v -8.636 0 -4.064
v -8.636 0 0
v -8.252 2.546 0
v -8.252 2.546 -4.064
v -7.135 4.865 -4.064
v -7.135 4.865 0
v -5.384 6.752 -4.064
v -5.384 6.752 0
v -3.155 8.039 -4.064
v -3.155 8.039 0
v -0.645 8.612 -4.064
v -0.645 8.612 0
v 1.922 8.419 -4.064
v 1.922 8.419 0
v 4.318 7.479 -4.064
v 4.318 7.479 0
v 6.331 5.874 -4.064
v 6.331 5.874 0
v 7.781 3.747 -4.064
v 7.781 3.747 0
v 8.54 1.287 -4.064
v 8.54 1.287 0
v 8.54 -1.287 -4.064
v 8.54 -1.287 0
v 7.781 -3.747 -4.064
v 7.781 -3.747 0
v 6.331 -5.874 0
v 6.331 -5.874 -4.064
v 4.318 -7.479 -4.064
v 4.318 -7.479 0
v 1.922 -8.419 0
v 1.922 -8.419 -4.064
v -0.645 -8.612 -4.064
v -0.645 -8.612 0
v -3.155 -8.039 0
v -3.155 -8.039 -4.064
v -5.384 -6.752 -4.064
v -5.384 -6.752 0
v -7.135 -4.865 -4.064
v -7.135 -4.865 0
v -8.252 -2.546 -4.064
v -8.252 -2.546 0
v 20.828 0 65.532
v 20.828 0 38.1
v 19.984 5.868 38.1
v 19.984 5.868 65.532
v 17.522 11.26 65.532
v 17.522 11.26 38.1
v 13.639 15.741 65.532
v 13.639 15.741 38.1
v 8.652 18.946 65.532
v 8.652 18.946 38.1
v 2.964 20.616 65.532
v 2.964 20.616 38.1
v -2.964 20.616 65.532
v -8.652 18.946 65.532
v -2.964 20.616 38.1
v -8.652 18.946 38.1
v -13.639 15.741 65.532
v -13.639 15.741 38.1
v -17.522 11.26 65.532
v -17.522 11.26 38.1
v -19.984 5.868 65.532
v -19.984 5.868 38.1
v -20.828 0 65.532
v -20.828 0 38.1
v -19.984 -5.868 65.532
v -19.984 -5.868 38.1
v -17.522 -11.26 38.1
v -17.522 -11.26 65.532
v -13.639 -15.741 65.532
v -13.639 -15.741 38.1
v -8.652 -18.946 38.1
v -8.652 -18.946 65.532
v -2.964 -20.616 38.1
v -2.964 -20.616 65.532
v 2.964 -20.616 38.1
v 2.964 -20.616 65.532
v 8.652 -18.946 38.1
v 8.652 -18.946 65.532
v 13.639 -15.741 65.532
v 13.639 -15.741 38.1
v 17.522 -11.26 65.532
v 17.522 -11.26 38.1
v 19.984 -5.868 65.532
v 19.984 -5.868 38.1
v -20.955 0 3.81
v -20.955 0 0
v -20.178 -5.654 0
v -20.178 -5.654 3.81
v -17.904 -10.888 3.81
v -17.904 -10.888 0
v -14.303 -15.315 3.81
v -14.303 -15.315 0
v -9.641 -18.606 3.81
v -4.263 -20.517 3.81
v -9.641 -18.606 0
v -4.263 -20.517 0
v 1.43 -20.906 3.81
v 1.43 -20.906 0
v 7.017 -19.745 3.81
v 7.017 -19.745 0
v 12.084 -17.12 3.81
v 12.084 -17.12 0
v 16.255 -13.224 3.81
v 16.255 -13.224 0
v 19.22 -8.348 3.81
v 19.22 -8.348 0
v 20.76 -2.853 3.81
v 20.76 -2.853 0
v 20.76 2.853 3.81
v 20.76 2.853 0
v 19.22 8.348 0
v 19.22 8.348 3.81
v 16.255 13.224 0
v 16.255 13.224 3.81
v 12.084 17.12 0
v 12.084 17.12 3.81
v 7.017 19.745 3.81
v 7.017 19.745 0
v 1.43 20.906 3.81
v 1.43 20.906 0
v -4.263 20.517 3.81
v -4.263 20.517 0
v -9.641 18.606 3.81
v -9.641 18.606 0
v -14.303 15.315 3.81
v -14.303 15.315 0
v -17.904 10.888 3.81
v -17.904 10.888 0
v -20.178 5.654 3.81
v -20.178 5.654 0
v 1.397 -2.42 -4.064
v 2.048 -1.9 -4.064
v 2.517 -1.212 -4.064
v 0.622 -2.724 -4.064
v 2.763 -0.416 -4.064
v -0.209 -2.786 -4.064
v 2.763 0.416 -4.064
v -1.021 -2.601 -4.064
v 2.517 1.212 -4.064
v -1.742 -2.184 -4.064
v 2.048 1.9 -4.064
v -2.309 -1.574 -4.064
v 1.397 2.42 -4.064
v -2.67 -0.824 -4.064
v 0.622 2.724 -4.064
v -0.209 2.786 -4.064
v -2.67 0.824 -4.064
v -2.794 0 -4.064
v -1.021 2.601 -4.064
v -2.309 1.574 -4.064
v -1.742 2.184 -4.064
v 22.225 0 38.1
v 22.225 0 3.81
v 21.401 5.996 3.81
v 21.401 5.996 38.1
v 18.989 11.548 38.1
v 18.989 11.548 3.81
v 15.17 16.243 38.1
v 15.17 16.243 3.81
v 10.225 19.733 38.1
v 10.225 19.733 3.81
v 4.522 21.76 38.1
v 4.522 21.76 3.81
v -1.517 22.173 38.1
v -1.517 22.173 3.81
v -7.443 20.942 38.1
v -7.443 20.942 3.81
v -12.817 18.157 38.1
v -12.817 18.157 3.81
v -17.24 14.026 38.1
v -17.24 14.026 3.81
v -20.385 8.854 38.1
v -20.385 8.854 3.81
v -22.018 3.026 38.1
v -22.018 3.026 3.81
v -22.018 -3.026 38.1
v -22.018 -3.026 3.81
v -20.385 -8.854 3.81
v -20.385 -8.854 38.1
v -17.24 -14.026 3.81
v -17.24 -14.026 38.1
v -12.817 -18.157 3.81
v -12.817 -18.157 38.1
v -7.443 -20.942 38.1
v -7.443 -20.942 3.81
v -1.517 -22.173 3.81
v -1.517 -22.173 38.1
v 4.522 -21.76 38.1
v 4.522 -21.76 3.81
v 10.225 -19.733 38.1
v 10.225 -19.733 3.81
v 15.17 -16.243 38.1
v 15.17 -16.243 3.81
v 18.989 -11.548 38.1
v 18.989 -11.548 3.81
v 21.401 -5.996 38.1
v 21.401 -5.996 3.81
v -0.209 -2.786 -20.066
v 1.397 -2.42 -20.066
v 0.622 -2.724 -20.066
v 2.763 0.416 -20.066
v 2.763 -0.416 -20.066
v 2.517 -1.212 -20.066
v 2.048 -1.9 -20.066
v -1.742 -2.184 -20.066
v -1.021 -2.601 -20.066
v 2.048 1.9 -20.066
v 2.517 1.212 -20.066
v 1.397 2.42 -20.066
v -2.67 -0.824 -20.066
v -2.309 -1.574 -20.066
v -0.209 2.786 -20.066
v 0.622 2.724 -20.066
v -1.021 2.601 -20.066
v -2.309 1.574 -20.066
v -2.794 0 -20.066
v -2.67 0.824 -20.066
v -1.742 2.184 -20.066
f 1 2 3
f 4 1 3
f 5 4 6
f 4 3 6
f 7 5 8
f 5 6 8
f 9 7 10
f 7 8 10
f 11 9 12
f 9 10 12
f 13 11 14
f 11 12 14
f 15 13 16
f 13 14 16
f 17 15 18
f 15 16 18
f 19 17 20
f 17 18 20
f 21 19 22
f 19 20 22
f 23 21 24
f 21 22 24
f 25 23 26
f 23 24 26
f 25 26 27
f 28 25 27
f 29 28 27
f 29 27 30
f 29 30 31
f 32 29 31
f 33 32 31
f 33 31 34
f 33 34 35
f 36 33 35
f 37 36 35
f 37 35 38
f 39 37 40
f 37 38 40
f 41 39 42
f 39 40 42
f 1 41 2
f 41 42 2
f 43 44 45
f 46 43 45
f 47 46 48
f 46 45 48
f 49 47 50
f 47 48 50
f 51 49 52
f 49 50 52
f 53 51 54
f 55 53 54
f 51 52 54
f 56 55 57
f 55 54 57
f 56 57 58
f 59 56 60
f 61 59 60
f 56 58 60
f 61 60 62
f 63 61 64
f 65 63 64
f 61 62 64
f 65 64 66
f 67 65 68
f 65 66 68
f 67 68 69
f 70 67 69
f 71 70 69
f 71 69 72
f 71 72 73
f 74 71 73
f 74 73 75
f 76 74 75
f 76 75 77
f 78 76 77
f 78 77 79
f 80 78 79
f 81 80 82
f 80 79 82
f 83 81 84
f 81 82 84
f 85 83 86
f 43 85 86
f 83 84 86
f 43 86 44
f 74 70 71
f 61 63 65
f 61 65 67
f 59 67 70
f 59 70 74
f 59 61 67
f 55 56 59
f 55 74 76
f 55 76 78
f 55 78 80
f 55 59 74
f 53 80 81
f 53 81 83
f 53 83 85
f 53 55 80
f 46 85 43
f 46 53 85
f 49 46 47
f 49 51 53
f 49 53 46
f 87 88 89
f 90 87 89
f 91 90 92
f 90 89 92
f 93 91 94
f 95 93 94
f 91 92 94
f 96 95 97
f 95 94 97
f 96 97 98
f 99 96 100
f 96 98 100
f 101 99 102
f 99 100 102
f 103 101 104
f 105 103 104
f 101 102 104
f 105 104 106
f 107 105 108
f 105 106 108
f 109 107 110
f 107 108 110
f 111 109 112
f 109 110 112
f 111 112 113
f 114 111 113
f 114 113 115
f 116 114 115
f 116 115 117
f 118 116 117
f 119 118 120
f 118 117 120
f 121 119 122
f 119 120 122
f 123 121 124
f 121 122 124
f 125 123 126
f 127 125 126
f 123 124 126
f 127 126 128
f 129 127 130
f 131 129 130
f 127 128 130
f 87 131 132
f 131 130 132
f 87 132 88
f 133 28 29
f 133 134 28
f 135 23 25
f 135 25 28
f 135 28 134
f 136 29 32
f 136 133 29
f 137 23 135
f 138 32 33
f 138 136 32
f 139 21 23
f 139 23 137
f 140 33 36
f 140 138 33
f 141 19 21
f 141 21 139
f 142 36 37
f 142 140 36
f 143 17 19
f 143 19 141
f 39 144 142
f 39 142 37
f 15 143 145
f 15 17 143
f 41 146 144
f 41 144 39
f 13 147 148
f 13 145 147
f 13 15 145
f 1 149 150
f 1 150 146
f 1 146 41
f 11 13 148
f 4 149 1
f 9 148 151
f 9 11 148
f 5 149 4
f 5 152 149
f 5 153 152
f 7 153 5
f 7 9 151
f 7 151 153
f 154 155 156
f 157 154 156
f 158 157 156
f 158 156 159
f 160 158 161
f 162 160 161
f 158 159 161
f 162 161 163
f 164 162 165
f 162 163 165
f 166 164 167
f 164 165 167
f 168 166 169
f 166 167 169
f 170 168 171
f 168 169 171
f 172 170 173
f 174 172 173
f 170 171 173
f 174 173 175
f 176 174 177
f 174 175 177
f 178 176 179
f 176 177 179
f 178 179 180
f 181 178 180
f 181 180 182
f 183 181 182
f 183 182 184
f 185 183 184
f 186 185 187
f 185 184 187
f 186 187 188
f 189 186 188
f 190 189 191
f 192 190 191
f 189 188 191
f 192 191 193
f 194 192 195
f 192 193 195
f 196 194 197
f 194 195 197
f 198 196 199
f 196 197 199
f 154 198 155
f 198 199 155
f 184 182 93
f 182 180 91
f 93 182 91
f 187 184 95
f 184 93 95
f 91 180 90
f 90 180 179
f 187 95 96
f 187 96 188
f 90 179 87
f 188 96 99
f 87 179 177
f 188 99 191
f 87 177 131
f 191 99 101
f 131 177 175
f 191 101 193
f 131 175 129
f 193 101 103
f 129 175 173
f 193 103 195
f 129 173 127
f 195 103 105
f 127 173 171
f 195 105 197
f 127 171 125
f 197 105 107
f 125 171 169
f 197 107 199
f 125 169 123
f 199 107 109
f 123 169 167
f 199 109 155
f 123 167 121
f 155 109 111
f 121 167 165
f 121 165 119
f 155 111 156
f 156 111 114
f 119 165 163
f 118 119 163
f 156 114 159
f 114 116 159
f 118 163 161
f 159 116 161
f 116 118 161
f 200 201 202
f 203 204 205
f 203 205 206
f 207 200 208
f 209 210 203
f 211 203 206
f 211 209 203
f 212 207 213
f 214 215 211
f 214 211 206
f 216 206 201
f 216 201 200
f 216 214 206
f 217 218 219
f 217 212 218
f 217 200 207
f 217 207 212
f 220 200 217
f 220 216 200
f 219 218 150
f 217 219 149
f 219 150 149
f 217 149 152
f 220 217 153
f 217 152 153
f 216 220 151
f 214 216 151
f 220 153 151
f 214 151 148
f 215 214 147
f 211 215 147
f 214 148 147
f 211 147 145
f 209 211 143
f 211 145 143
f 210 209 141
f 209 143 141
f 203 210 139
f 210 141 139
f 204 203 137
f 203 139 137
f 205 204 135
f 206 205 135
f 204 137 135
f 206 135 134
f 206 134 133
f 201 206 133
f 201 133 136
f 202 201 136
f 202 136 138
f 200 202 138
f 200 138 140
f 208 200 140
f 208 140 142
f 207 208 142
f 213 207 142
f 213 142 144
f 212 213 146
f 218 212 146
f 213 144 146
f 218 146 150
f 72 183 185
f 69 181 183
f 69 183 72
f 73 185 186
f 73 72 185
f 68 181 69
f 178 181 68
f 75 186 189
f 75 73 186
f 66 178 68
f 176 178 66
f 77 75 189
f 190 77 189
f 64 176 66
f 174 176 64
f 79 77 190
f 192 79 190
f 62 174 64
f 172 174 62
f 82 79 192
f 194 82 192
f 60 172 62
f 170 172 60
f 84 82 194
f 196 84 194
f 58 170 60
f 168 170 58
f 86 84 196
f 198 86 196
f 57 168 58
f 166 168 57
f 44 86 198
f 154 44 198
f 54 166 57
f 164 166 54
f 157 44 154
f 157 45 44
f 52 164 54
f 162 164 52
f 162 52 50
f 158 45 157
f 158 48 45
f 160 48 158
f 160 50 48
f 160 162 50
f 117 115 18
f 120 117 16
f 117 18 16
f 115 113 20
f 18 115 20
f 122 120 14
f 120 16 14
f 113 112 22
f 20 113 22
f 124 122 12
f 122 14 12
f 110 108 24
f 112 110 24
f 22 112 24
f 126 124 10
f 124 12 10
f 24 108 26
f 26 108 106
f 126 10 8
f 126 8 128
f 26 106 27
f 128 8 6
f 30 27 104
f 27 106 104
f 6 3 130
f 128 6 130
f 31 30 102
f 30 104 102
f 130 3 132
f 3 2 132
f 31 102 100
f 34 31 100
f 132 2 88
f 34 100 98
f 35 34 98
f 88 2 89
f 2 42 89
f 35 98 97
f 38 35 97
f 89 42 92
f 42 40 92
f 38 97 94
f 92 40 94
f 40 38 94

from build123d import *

# Parameters (mm, degrees)
SKETCH3_R           = 20.955
BOSS_EXTRUDE3_DEPTH = 3.81
SKETCH4_R           = 22.225
BOSS_EXTRUDE4_DEPTH = 34.29
SKETCH5_R           = 20.828
BOSS_EXTRUDE5_DEPTH = 27.432
SKETCH6_R           = 8.636
BOSS_EXTRUDE6_DEPTH = 4.064
SKETCH7_R           = 2.794
BOSS_EXTRUDE7_DEPTH = 16.002


with BuildPart() as part:
    # Sketch3 → Boss-Extrude3 (new body)
    with BuildSketch(Plane.XY):
        with Locations(Location((0, 0, 0), (0, 0, 180))):
            Circle(SKETCH3_R)
    extrude(amount=BOSS_EXTRUDE3_DEPTH)

    # Sketch4 → Boss-Extrude4 (add)
    with BuildSketch(Plane.XY.offset(3.81)):
        Circle(SKETCH4_R)
    extrude(amount=BOSS_EXTRUDE4_DEPTH)

    # Sketch5 → Boss-Extrude5 (add)
    with BuildSketch(Plane.XY.offset(38.1)):
        Circle(SKETCH5_R)
    extrude(amount=BOSS_EXTRUDE5_DEPTH)

    # Sketch6 → Boss-Extrude6 (add)
    with BuildSketch(Plane(origin=(0, 0, 0), x_dir=(-1, 0, 0), z_dir=(0, 0, -1))):
        Circle(SKETCH6_R)
    extrude(amount=BOSS_EXTRUDE6_DEPTH)

    # Sketch7 → Boss-Extrude7 (add)
    with BuildSketch(Plane(origin=(0, 0, -4.064), x_dir=(-1, 0, 0), z_dir=(0, 0, -1))):
        Circle(SKETCH7_R)
    extrude(amount=BOSS_EXTRUDE7_DEPTH)


solid = part.part
